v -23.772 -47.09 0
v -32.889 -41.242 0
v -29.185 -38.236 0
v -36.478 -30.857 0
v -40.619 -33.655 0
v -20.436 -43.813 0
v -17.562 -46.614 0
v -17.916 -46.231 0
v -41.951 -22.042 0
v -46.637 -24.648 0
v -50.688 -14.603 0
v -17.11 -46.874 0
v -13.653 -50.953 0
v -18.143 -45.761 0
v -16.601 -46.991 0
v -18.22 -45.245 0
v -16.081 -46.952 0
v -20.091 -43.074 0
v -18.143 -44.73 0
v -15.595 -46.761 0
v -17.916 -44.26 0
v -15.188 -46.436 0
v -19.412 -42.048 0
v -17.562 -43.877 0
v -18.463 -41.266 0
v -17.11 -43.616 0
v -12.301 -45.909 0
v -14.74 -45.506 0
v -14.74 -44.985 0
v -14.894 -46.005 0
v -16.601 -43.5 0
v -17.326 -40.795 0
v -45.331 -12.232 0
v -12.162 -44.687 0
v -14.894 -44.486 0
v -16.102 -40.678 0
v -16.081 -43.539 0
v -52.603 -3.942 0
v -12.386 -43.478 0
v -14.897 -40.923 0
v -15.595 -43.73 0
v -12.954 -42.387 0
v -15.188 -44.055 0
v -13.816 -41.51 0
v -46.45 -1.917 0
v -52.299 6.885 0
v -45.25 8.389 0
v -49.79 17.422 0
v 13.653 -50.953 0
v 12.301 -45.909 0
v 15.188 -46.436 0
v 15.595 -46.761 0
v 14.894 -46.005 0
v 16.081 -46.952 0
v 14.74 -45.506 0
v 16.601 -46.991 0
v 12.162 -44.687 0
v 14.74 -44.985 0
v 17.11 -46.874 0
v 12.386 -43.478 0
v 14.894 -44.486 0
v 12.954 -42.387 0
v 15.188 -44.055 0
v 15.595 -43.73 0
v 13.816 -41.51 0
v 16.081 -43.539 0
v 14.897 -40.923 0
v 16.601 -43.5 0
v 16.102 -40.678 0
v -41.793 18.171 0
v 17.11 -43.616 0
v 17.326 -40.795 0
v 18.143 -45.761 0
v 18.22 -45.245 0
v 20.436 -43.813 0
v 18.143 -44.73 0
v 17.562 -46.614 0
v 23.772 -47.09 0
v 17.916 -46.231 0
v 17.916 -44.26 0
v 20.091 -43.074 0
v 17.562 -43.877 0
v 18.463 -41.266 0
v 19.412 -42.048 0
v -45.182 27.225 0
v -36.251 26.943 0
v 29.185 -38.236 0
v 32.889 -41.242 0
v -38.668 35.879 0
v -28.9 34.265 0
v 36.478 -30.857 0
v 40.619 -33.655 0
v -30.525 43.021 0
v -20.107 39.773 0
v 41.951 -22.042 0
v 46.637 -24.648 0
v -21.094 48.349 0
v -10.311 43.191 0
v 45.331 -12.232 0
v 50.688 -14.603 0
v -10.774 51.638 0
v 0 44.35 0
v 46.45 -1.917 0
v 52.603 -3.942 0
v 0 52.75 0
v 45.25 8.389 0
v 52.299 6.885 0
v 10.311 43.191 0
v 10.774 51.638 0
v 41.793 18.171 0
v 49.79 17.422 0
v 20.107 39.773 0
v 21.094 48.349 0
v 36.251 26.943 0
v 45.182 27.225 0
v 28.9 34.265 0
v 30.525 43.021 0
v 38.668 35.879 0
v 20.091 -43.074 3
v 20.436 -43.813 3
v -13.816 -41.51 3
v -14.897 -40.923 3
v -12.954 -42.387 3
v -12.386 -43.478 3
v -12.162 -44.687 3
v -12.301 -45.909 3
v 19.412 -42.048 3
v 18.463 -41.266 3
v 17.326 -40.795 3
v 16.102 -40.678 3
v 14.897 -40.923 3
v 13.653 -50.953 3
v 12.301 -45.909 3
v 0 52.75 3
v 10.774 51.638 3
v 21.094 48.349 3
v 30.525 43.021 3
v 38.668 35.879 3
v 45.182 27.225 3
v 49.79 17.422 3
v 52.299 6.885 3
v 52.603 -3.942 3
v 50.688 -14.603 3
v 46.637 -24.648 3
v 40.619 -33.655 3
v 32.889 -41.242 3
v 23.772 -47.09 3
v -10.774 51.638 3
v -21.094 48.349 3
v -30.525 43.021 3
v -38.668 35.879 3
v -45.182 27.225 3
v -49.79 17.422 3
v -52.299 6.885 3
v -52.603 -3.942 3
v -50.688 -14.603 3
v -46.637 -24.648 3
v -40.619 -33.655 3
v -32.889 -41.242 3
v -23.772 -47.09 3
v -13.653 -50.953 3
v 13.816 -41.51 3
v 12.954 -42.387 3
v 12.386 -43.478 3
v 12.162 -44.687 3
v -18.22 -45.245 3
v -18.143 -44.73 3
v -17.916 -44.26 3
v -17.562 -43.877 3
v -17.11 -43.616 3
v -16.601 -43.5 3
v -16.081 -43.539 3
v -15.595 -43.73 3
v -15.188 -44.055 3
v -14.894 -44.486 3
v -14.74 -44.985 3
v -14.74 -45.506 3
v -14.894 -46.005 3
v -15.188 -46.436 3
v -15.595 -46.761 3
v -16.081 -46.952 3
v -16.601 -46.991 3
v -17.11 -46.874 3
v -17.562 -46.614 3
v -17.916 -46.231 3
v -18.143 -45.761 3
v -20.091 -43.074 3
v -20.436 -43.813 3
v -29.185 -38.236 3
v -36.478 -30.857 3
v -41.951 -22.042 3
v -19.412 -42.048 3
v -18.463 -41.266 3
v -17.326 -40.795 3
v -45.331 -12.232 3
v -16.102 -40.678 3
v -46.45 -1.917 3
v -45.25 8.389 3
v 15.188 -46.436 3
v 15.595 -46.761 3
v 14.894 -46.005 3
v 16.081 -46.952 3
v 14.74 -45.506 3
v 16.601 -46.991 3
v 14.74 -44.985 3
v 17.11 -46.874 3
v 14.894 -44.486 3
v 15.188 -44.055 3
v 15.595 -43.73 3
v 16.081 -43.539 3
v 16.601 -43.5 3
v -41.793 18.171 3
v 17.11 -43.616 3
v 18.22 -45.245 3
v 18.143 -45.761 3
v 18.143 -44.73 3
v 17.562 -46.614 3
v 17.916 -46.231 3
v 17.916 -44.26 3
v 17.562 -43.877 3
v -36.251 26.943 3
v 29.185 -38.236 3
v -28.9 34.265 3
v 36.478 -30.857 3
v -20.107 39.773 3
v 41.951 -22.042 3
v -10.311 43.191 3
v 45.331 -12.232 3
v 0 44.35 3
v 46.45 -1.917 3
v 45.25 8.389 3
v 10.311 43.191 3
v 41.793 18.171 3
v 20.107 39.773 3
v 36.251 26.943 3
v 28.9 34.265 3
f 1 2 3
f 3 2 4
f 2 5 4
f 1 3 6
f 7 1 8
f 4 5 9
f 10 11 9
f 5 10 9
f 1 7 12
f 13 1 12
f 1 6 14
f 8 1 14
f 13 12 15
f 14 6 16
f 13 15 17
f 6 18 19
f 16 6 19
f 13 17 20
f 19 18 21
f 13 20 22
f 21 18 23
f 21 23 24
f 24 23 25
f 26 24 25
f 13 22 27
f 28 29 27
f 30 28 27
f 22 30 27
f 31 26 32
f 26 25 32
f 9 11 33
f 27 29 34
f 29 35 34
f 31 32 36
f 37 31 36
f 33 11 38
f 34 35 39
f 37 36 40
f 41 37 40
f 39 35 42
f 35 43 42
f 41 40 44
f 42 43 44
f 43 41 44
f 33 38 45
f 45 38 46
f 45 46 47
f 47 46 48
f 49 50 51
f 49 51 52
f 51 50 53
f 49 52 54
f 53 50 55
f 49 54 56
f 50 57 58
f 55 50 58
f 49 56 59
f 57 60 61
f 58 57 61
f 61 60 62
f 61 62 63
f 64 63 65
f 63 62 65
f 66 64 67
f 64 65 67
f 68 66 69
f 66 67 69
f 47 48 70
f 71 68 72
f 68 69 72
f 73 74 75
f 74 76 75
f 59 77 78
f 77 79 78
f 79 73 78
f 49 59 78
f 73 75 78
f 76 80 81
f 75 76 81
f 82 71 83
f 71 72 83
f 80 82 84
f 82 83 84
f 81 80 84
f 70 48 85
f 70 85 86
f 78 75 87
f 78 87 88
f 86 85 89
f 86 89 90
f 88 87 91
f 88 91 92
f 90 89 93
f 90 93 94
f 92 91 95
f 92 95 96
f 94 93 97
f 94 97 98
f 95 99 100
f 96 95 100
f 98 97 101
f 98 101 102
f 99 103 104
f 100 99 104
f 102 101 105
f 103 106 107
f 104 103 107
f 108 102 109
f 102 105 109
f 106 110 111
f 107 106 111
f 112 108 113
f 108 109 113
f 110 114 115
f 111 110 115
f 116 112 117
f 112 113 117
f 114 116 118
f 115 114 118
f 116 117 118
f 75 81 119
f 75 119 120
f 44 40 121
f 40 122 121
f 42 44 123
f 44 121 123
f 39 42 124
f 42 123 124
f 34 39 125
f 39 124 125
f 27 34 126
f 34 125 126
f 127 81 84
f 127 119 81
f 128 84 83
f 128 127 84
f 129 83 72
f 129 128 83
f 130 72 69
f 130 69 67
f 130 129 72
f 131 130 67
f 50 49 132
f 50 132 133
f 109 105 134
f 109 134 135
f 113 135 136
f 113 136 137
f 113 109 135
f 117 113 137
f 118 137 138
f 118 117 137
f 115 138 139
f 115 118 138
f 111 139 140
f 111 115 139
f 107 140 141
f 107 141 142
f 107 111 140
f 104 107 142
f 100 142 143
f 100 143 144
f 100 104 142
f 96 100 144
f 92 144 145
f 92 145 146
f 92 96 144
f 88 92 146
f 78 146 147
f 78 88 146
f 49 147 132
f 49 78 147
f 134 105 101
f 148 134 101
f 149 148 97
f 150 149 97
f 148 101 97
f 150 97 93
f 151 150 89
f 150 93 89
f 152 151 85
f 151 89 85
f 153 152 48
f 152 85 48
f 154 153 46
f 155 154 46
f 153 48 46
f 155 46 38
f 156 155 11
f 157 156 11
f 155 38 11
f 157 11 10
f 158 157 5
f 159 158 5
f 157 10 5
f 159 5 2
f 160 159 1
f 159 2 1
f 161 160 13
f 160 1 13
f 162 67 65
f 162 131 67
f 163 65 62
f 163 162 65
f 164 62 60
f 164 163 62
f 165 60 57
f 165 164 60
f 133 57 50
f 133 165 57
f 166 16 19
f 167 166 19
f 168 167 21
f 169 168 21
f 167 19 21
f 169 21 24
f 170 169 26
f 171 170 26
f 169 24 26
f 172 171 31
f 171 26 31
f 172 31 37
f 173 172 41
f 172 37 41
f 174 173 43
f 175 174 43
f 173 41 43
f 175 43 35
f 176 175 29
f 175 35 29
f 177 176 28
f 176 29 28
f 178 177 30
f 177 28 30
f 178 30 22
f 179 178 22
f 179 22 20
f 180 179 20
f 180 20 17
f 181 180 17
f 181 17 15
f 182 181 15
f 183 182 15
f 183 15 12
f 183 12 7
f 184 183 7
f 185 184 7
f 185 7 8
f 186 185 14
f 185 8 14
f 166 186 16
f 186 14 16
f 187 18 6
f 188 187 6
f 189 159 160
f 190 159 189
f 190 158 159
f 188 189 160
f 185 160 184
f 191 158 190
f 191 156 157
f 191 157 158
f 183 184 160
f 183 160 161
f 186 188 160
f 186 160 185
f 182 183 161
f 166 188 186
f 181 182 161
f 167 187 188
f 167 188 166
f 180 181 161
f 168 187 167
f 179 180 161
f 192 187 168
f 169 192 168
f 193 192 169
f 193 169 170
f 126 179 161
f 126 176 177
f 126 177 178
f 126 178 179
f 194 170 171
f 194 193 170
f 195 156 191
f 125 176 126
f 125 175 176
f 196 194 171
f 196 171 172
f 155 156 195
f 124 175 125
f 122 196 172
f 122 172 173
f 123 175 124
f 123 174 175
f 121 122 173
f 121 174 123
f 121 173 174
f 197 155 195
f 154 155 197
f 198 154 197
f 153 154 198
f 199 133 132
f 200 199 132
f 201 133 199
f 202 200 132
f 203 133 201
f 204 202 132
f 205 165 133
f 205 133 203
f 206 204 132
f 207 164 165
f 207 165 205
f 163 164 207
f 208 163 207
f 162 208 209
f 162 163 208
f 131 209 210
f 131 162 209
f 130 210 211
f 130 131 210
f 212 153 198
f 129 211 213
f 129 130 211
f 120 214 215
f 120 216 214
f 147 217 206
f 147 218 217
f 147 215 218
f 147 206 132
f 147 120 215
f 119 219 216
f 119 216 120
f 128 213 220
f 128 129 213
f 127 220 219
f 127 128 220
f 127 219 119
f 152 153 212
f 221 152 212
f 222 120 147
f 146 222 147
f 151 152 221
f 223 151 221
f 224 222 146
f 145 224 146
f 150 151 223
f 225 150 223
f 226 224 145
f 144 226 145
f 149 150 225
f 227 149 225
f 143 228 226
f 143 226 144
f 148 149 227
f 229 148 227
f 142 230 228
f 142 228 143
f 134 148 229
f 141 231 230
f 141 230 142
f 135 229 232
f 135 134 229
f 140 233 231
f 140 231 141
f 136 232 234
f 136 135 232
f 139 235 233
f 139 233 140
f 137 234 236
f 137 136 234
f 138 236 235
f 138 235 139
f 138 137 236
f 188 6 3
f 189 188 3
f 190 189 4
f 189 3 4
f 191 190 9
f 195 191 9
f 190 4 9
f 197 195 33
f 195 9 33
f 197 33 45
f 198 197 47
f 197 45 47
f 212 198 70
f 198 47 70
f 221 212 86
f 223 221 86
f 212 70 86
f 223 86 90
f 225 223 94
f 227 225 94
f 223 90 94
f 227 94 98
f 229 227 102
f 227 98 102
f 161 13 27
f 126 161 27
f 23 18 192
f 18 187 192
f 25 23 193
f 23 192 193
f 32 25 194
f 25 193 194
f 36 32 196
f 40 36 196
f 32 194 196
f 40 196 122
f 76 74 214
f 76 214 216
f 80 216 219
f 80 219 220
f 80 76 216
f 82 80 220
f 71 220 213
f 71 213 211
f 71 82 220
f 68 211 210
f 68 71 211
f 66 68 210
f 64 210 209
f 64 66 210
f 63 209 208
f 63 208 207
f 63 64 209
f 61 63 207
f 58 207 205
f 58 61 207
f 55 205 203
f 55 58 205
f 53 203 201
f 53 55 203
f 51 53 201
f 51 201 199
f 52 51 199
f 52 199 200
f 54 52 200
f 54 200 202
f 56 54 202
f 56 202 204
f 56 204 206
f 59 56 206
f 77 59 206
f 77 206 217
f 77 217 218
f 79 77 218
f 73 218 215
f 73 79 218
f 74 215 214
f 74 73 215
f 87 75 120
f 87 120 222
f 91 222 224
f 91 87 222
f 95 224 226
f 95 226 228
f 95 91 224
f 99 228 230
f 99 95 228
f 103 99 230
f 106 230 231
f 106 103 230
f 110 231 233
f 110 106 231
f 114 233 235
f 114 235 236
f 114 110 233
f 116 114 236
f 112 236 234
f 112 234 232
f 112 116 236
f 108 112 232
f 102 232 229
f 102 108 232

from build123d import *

# Parameters (mm, degrees)
SKETCH2_R           = 1.75
BOSS_EXTRUDE1_DEPTH = 3
FILLET1_R           = 4.16054


with BuildPart() as part:
    # Sketch2 → Boss-Extrude1 (new body)
    with BuildSketch(Plane.XY):
        with BuildLine():
            Line((18.479229397, -39.61885681), (20.435570278, -43.813186973))
            ThreePointArc((20.435570278, -43.813186973), (45.250304059, 8.388683548), (0, 44.35))
            Line((0, 44.35), (0, 52.75))
            ThreePointArc((0, 52.75), (52.298716437, 6.88525664), (13.652704629, -50.952587337))
            Line((13.652704629, -50.952587337), (11.314672737, -42.226933525))
            Line((11.314672737, -42.226933525), (18.479229397, -39.61885681))
        make_face()
        with Locations((16.470452213, -45.245405335)):
            Circle(SKETCH2_R, mode=Mode.SUBTRACT)
    extrude(amount=BOSS_EXTRUDE1_DEPTH)

    # Fillet1
    fillet1_edges = [part.edges().sort_by_distance(p)[0] for p in [
        (18.479229397, -39.61885681, 1.5),
        (11.314672737, -42.226933525, 1.5),
    ]]
    fillet(fillet1_edges, radius=FILLET1_R - 0.0001)  # a hair under: the kernel refuses the full size

    # Mirror1: part across plane


with BuildPart() as part_1:
    add(part.part)
    add(part.part.mirror(Plane(origin=(0, 52.75, 3), x_dir=(0, 0, 1), z_dir=(1, 0, 0))))


solid = part_1.part
